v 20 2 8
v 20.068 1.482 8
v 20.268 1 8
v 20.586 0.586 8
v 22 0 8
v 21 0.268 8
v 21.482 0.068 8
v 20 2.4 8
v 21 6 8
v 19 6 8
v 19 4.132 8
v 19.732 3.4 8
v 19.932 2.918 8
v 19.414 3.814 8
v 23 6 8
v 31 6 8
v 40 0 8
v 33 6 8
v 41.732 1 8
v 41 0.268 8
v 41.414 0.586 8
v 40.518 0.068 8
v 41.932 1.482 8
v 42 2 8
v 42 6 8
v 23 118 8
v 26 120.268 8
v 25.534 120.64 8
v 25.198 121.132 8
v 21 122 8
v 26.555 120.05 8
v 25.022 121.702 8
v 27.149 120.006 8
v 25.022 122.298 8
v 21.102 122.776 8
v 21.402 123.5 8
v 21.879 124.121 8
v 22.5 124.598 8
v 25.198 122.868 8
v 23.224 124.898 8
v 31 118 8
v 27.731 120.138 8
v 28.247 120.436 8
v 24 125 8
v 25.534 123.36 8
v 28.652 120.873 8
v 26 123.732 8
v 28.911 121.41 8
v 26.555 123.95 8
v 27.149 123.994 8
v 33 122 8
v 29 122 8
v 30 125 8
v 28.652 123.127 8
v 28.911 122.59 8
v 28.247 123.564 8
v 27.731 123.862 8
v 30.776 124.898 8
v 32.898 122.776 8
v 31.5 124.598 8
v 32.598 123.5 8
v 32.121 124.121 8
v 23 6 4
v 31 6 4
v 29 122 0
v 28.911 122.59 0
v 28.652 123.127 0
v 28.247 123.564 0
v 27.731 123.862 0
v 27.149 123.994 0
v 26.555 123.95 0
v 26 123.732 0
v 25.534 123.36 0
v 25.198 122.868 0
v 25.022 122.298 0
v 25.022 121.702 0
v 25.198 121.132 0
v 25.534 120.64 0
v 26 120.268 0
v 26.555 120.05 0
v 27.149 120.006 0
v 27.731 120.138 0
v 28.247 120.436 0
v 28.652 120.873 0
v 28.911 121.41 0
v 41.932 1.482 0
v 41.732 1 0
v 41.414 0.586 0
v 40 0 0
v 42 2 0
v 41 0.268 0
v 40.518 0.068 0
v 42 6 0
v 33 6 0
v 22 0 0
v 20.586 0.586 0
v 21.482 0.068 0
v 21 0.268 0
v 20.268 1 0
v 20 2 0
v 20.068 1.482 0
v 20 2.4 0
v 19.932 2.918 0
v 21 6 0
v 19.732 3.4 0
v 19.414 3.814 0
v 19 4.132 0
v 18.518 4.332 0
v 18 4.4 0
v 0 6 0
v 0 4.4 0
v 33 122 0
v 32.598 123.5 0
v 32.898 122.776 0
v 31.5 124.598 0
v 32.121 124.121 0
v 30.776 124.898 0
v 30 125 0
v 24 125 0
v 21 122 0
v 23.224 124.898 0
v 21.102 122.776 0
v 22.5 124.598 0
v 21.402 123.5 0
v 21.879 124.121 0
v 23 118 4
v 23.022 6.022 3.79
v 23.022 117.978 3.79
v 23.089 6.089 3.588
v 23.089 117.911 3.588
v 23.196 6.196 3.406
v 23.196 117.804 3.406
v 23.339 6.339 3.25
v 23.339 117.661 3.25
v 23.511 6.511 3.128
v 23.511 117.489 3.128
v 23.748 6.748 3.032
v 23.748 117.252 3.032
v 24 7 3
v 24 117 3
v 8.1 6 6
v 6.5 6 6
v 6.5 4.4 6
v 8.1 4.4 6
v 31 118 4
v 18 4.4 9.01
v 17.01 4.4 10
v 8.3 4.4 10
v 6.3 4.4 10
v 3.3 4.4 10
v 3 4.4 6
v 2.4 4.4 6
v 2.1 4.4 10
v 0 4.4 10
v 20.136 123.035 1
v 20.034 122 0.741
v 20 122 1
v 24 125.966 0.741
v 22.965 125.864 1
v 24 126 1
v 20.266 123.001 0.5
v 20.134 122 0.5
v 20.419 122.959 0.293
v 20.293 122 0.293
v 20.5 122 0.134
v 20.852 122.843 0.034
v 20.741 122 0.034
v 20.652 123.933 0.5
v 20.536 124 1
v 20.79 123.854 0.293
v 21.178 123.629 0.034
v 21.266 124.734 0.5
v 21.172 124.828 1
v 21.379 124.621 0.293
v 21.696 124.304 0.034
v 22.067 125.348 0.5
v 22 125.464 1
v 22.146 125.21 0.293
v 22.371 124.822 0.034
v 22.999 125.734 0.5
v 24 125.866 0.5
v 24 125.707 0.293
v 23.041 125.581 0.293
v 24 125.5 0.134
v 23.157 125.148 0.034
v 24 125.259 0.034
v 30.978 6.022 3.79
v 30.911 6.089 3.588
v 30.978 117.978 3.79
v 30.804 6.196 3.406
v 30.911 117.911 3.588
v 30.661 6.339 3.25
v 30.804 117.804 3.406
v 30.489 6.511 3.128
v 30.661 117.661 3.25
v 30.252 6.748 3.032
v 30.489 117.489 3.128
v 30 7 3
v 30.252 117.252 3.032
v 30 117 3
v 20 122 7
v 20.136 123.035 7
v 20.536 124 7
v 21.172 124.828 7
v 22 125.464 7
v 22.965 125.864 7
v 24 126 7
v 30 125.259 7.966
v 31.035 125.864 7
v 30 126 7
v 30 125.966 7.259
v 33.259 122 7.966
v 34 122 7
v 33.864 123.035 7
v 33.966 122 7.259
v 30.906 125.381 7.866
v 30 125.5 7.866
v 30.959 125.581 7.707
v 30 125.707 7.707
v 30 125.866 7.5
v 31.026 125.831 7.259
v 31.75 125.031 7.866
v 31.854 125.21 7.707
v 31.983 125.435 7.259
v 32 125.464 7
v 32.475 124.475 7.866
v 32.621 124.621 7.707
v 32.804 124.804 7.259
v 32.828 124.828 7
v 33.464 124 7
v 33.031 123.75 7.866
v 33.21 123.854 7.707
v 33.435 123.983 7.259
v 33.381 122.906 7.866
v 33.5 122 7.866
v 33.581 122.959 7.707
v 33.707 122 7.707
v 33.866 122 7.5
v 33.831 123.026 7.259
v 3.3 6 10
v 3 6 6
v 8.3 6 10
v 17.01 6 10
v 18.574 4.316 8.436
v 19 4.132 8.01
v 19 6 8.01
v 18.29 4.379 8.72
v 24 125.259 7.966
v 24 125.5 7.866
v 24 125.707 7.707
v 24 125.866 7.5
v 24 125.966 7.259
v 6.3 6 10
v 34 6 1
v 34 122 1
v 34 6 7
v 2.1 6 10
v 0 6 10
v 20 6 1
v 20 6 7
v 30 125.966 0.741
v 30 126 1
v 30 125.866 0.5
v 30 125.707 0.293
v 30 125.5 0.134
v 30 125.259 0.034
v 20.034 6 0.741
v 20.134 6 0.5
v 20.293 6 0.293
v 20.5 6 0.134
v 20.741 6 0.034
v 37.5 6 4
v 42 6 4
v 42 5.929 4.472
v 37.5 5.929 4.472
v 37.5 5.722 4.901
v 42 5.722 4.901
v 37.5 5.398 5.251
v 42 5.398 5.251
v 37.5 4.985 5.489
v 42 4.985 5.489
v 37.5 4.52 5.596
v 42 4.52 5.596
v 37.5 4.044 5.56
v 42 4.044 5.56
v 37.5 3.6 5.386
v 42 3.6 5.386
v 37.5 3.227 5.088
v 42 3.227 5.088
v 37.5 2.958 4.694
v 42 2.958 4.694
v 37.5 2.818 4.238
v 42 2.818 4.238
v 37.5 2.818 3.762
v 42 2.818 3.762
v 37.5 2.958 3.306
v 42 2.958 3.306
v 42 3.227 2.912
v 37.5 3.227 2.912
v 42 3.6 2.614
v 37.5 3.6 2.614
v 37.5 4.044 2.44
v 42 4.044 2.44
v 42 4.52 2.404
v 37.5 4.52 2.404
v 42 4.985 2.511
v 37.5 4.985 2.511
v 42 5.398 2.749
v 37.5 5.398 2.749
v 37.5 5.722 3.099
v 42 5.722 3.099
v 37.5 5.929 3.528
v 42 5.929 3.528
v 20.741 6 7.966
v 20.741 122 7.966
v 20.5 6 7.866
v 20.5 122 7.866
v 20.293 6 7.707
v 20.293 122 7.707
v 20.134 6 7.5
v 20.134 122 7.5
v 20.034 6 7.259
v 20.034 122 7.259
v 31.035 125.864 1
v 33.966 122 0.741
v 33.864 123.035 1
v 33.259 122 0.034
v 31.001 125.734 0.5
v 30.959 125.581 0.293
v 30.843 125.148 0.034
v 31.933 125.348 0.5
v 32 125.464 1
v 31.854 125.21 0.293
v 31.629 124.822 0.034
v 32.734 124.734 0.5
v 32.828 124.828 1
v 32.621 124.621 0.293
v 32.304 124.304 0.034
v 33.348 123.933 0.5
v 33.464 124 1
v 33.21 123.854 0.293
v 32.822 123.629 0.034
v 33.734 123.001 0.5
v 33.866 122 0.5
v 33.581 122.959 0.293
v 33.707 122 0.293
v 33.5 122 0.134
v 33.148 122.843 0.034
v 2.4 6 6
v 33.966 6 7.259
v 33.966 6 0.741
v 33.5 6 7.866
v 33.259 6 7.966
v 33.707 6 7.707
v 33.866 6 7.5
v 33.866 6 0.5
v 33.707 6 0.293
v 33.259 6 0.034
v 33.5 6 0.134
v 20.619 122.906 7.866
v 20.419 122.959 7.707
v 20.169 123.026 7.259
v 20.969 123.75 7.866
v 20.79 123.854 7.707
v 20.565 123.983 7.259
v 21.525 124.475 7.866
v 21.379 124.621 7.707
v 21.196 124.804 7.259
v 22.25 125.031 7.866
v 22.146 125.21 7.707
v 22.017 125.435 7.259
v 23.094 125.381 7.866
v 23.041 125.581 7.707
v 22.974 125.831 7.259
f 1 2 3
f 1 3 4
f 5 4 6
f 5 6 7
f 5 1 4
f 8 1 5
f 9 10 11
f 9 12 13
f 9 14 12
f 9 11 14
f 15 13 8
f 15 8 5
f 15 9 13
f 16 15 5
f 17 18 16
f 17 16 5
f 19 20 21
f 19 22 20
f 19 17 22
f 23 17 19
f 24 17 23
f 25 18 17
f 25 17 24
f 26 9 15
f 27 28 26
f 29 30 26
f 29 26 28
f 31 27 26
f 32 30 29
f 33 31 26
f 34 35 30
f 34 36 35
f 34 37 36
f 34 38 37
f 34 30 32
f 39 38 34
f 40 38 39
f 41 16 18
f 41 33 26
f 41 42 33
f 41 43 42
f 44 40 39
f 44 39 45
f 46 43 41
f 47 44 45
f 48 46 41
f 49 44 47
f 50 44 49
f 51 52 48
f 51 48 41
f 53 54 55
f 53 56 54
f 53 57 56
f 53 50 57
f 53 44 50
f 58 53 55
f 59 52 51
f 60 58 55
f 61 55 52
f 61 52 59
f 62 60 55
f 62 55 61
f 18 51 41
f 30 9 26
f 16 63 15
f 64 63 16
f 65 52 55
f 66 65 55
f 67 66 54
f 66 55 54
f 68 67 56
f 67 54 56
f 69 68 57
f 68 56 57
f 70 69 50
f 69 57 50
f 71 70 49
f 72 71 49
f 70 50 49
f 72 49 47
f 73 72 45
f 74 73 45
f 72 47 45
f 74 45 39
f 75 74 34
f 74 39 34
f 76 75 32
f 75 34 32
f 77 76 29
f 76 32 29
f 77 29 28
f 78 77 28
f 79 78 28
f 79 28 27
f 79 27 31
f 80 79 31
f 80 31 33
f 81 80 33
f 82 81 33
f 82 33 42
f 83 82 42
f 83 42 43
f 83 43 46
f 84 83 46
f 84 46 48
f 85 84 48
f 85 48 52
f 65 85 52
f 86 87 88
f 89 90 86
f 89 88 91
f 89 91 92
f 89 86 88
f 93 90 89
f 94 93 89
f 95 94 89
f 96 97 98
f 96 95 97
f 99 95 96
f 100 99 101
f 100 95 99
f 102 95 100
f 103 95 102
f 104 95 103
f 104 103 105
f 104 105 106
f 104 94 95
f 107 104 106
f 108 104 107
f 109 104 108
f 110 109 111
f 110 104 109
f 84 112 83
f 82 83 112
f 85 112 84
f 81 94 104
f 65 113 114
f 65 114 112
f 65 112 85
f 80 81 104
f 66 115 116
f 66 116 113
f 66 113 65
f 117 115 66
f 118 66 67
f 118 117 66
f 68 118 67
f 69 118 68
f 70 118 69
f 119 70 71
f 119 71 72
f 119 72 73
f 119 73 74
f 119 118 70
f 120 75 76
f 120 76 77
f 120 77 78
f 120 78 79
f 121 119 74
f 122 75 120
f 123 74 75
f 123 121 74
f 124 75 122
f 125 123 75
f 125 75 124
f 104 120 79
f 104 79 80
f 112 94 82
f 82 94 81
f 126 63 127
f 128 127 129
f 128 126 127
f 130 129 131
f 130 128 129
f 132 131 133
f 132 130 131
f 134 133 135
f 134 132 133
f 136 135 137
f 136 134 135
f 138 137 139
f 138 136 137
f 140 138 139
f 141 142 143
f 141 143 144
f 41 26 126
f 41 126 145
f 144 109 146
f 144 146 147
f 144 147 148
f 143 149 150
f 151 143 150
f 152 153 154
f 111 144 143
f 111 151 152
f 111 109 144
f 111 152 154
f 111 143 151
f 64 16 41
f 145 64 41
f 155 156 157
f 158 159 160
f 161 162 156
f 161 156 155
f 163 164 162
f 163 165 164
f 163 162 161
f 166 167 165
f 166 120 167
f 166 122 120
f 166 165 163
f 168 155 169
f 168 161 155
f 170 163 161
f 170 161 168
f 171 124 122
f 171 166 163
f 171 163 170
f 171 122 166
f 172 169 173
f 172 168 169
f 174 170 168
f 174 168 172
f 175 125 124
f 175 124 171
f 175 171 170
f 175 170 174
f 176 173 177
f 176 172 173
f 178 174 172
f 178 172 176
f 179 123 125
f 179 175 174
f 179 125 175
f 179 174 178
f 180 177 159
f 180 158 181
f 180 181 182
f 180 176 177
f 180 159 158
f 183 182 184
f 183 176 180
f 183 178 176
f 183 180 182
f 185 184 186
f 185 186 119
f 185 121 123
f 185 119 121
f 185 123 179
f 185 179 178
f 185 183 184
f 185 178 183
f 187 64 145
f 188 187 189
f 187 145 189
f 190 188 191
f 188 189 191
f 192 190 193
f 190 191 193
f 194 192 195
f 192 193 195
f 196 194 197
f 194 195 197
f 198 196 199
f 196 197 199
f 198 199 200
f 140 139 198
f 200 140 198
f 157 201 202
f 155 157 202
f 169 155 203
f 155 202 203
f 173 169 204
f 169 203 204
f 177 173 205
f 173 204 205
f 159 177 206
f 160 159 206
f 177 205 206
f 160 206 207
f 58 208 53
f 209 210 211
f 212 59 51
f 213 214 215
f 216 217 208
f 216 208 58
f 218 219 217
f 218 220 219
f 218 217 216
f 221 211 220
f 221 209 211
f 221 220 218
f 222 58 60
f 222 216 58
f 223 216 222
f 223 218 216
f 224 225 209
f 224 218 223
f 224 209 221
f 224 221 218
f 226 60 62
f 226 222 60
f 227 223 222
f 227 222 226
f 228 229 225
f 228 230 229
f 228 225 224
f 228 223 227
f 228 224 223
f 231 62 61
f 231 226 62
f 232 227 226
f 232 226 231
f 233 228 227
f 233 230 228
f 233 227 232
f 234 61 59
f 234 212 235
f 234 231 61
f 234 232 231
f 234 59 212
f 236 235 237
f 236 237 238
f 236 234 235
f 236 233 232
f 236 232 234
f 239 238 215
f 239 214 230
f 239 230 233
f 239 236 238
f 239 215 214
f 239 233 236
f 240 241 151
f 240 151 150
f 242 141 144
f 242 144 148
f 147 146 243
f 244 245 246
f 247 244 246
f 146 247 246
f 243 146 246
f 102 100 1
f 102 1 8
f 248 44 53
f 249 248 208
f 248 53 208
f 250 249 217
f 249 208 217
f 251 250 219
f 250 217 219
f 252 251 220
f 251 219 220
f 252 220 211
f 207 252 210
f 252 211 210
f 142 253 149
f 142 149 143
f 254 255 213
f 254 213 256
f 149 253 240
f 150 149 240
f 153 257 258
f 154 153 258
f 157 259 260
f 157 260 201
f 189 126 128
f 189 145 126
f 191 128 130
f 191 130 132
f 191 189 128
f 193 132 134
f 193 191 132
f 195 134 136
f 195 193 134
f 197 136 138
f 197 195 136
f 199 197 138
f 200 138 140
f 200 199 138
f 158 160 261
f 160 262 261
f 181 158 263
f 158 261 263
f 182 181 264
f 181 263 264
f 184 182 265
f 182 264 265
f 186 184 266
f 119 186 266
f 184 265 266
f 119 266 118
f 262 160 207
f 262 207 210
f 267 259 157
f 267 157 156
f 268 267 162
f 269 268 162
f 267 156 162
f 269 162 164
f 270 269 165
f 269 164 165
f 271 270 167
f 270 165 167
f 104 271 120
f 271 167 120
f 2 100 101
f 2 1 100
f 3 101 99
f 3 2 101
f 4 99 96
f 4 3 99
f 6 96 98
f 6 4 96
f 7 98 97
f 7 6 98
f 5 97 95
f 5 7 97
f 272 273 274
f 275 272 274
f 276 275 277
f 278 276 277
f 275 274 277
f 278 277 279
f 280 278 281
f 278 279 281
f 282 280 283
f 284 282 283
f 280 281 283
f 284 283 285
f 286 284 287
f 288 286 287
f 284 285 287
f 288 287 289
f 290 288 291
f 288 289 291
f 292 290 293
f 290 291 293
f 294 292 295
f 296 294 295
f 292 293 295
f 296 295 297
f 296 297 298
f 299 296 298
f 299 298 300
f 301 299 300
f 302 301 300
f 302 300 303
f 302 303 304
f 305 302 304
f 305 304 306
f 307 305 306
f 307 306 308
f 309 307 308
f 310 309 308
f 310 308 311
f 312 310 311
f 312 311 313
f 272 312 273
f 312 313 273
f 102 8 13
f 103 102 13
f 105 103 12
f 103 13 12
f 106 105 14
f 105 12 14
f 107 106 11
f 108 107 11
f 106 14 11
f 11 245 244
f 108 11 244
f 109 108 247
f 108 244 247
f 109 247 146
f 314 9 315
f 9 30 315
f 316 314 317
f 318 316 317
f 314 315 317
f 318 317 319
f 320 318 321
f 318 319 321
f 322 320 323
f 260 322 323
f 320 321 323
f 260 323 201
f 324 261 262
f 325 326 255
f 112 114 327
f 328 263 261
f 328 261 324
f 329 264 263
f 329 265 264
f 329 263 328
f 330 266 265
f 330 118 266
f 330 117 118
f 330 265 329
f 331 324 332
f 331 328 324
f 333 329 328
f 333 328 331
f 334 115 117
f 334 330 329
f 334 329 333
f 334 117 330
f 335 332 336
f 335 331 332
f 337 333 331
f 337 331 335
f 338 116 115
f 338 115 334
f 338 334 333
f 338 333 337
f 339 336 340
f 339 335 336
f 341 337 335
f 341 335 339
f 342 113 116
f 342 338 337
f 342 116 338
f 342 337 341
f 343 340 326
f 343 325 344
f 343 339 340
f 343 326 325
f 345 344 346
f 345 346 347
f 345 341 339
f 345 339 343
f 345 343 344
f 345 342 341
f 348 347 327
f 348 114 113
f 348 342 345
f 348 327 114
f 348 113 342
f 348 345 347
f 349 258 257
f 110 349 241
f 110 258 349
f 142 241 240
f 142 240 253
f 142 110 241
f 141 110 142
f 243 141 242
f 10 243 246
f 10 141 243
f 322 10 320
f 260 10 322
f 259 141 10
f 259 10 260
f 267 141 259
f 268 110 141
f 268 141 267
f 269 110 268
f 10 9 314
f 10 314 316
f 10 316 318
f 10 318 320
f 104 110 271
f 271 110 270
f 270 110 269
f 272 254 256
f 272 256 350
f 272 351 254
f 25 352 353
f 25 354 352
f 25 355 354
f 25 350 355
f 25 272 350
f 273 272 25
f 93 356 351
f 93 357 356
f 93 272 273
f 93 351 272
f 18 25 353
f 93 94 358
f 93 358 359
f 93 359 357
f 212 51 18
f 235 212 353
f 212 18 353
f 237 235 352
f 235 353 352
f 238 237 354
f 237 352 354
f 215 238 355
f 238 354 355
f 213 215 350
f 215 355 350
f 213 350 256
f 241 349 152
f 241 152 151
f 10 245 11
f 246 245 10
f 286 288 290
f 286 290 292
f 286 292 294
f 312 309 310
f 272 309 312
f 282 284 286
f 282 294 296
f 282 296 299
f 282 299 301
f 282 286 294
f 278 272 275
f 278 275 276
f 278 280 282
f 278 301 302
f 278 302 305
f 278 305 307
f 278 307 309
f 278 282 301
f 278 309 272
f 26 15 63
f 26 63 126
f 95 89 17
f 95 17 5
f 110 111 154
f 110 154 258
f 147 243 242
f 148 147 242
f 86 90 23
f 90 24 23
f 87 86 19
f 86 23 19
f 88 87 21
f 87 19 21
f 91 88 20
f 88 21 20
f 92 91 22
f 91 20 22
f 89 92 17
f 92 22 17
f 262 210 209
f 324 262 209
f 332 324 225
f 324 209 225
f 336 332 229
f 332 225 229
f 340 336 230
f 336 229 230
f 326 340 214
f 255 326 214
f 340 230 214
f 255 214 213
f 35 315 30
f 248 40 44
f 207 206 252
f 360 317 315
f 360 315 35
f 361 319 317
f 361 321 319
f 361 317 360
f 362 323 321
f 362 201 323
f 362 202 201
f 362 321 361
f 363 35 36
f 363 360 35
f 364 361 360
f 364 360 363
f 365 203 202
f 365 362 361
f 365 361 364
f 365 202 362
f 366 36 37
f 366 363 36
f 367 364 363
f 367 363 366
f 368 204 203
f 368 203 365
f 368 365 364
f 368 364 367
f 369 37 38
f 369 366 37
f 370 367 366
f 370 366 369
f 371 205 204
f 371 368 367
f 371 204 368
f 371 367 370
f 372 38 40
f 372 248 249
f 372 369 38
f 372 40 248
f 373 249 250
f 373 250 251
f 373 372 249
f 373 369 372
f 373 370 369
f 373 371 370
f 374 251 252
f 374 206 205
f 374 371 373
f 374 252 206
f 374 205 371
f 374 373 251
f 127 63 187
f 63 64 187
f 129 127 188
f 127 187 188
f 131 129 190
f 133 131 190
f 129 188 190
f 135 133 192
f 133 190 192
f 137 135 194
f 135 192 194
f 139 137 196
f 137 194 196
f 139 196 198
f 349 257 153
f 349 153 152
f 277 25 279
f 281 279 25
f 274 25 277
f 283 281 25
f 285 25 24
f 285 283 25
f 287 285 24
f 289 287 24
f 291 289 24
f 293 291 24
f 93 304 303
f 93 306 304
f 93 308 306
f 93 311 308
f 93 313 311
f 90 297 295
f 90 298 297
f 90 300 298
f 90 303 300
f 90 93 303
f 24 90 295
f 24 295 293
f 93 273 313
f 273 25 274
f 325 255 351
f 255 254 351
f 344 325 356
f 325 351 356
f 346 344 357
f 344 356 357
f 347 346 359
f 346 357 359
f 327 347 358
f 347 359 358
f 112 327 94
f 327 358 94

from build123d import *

# Parameters (mm, degrees)
PAD_DEPTH       = 10
SKETCH001_W     = 14
SKETCH001_H     = 120
POCKET_DEPTH    = 2
SKETCH002_W     = 8
SKETCH002_H     = 112
POCKET001_DEPTH = 5
SKETCH003_W     = 23
SKETCH003_H     = 6
POCKET002_DEPTH = 2
SKETCH004_R     = 2
POCKET003_DEPTH = 8.001
FILLET_R        = 1
FILLET001_R     = 4
FILLET002_R     = 1
CHAMFER_SIZE    = 1.99
FILLET003_R     = 2
FILLET004_R     = 2
POCKET004_DEPTH = 6.001
SKETCH006_R     = 1.6
POCKET005_DEPTH = 4.5


with BuildPart() as part:
    # Sketch → Pad (new body)
    with BuildSketch(Plane.XY):
        Polygon((0, 6), (20, 6), (20, 126), (34, 126), (34, 6), (42, 6), (42, 0), (20, 0), (20, 4.4), (0, 4.4), align=None)
    extrude(amount=PAD_DEPTH)

    # Sketch001 (on DatumPlane) → Pocket (cut)
    with BuildSketch(Plane.XY.offset(10)):
        with Locations((27, 66)):
            Rectangle(SKETCH001_W, SKETCH001_H)
    extrude(amount=-POCKET_DEPTH, mode=Mode.SUBTRACT)

    # Sketch002 (on DatumPlane) → Pocket001 (cut)
    with BuildSketch(Plane.XY.offset(8)):
        with Locations((27, 62)):
            Rectangle(SKETCH002_W, SKETCH002_H)
    extrude(amount=-POCKET001_DEPTH, mode=Mode.SUBTRACT)

    # Sketch003 (on DatumPlane) → Pocket002 (cut)
    with BuildSketch(Plane.XY.offset(10)):
        with Locations((30.5, 3)):
            Rectangle(SKETCH003_W, SKETCH003_H)
    extrude(amount=-POCKET002_DEPTH, mode=Mode.SUBTRACT)

    # Sketch004 (on DatumPlane) → Pocket003 (cut, through all)
    with BuildSketch(Plane.XY.offset(8)):
        with Locations((27, 122)):
            Circle(SKETCH004_R)
    extrude(amount=-POCKET003_DEPTH, mode=Mode.SUBTRACT)

    # Fillet
    fillet_edges = [part.edges().sort_by_distance(p)[0] for p in [
        (27, 118, 3),
        (31, 62, 3),
        (27, 6, 3),
        (23, 62, 3),
    ]]
    fillet(fillet_edges, radius=FILLET_R)

    # Fillet001
    fillet001_edges = [part.edges().sort_by_distance(p)[0] for p in [
        (20, 126, 4),
        (34, 126, 4),
    ]]
    fillet(fillet001_edges, radius=FILLET001_R)

    # Fillet002
    fillet002_edges = [part.edges().sort_by_distance(p)[0] for p in [
        (20, 64, 8),
        (34, 64, 8),
        (34, 64, 0),
        (20, 64, 0),
    ]]
    fillet(fillet002_edges, radius=FILLET002_R)

    # Chamfer
    chamfer_edges = [part.edges().sort_by_distance(p)[0] for p in [
        (19, 5.2, 10),
    ]]
    chamfer(chamfer_edges, length=CHAMFER_SIZE)

    # Fillet003
    fillet003_edges = [part.edges().sort_by_distance(p)[0] for p in [
        (20, 0, 4),
        (42, 0, 4),
    ]]
    fillet(fillet003_edges, radius=FILLET003_R)

    # Fillet004
    fillet004_edges = [part.edges().sort_by_distance(p)[0] for p in [
        (20, 4.4, 4),
    ]]
    fillet(fillet004_edges, radius=FILLET004_R)

    # Sketch005 (on DatumPlane) → Pocket004 (cut, through all)
    with BuildSketch(Plane(origin=(0, 6, 0), x_dir=(-1, 0, 0), z_dir=(0, 1, 0))):
        Polygon((-3.3, 10), (-2.1, 10), (-2.4, 6), (-3, 6), align=None)
        Polygon((-8.3, 10), (-6.3, 10), (-6.5, 6), (-8.1, 6), align=None)
    extrude(amount=-POCKET004_DEPTH, mode=Mode.SUBTRACT)

    # Sketch006 (on DatumPlane) → Pocket005 (cut)
    with BuildSketch(Plane.YZ.offset(42)):
        with Locations((4.4, 4)):
            Circle(SKETCH006_R)
    extrude(amount=-POCKET005_DEPTH, mode=Mode.SUBTRACT)


solid = part.part
